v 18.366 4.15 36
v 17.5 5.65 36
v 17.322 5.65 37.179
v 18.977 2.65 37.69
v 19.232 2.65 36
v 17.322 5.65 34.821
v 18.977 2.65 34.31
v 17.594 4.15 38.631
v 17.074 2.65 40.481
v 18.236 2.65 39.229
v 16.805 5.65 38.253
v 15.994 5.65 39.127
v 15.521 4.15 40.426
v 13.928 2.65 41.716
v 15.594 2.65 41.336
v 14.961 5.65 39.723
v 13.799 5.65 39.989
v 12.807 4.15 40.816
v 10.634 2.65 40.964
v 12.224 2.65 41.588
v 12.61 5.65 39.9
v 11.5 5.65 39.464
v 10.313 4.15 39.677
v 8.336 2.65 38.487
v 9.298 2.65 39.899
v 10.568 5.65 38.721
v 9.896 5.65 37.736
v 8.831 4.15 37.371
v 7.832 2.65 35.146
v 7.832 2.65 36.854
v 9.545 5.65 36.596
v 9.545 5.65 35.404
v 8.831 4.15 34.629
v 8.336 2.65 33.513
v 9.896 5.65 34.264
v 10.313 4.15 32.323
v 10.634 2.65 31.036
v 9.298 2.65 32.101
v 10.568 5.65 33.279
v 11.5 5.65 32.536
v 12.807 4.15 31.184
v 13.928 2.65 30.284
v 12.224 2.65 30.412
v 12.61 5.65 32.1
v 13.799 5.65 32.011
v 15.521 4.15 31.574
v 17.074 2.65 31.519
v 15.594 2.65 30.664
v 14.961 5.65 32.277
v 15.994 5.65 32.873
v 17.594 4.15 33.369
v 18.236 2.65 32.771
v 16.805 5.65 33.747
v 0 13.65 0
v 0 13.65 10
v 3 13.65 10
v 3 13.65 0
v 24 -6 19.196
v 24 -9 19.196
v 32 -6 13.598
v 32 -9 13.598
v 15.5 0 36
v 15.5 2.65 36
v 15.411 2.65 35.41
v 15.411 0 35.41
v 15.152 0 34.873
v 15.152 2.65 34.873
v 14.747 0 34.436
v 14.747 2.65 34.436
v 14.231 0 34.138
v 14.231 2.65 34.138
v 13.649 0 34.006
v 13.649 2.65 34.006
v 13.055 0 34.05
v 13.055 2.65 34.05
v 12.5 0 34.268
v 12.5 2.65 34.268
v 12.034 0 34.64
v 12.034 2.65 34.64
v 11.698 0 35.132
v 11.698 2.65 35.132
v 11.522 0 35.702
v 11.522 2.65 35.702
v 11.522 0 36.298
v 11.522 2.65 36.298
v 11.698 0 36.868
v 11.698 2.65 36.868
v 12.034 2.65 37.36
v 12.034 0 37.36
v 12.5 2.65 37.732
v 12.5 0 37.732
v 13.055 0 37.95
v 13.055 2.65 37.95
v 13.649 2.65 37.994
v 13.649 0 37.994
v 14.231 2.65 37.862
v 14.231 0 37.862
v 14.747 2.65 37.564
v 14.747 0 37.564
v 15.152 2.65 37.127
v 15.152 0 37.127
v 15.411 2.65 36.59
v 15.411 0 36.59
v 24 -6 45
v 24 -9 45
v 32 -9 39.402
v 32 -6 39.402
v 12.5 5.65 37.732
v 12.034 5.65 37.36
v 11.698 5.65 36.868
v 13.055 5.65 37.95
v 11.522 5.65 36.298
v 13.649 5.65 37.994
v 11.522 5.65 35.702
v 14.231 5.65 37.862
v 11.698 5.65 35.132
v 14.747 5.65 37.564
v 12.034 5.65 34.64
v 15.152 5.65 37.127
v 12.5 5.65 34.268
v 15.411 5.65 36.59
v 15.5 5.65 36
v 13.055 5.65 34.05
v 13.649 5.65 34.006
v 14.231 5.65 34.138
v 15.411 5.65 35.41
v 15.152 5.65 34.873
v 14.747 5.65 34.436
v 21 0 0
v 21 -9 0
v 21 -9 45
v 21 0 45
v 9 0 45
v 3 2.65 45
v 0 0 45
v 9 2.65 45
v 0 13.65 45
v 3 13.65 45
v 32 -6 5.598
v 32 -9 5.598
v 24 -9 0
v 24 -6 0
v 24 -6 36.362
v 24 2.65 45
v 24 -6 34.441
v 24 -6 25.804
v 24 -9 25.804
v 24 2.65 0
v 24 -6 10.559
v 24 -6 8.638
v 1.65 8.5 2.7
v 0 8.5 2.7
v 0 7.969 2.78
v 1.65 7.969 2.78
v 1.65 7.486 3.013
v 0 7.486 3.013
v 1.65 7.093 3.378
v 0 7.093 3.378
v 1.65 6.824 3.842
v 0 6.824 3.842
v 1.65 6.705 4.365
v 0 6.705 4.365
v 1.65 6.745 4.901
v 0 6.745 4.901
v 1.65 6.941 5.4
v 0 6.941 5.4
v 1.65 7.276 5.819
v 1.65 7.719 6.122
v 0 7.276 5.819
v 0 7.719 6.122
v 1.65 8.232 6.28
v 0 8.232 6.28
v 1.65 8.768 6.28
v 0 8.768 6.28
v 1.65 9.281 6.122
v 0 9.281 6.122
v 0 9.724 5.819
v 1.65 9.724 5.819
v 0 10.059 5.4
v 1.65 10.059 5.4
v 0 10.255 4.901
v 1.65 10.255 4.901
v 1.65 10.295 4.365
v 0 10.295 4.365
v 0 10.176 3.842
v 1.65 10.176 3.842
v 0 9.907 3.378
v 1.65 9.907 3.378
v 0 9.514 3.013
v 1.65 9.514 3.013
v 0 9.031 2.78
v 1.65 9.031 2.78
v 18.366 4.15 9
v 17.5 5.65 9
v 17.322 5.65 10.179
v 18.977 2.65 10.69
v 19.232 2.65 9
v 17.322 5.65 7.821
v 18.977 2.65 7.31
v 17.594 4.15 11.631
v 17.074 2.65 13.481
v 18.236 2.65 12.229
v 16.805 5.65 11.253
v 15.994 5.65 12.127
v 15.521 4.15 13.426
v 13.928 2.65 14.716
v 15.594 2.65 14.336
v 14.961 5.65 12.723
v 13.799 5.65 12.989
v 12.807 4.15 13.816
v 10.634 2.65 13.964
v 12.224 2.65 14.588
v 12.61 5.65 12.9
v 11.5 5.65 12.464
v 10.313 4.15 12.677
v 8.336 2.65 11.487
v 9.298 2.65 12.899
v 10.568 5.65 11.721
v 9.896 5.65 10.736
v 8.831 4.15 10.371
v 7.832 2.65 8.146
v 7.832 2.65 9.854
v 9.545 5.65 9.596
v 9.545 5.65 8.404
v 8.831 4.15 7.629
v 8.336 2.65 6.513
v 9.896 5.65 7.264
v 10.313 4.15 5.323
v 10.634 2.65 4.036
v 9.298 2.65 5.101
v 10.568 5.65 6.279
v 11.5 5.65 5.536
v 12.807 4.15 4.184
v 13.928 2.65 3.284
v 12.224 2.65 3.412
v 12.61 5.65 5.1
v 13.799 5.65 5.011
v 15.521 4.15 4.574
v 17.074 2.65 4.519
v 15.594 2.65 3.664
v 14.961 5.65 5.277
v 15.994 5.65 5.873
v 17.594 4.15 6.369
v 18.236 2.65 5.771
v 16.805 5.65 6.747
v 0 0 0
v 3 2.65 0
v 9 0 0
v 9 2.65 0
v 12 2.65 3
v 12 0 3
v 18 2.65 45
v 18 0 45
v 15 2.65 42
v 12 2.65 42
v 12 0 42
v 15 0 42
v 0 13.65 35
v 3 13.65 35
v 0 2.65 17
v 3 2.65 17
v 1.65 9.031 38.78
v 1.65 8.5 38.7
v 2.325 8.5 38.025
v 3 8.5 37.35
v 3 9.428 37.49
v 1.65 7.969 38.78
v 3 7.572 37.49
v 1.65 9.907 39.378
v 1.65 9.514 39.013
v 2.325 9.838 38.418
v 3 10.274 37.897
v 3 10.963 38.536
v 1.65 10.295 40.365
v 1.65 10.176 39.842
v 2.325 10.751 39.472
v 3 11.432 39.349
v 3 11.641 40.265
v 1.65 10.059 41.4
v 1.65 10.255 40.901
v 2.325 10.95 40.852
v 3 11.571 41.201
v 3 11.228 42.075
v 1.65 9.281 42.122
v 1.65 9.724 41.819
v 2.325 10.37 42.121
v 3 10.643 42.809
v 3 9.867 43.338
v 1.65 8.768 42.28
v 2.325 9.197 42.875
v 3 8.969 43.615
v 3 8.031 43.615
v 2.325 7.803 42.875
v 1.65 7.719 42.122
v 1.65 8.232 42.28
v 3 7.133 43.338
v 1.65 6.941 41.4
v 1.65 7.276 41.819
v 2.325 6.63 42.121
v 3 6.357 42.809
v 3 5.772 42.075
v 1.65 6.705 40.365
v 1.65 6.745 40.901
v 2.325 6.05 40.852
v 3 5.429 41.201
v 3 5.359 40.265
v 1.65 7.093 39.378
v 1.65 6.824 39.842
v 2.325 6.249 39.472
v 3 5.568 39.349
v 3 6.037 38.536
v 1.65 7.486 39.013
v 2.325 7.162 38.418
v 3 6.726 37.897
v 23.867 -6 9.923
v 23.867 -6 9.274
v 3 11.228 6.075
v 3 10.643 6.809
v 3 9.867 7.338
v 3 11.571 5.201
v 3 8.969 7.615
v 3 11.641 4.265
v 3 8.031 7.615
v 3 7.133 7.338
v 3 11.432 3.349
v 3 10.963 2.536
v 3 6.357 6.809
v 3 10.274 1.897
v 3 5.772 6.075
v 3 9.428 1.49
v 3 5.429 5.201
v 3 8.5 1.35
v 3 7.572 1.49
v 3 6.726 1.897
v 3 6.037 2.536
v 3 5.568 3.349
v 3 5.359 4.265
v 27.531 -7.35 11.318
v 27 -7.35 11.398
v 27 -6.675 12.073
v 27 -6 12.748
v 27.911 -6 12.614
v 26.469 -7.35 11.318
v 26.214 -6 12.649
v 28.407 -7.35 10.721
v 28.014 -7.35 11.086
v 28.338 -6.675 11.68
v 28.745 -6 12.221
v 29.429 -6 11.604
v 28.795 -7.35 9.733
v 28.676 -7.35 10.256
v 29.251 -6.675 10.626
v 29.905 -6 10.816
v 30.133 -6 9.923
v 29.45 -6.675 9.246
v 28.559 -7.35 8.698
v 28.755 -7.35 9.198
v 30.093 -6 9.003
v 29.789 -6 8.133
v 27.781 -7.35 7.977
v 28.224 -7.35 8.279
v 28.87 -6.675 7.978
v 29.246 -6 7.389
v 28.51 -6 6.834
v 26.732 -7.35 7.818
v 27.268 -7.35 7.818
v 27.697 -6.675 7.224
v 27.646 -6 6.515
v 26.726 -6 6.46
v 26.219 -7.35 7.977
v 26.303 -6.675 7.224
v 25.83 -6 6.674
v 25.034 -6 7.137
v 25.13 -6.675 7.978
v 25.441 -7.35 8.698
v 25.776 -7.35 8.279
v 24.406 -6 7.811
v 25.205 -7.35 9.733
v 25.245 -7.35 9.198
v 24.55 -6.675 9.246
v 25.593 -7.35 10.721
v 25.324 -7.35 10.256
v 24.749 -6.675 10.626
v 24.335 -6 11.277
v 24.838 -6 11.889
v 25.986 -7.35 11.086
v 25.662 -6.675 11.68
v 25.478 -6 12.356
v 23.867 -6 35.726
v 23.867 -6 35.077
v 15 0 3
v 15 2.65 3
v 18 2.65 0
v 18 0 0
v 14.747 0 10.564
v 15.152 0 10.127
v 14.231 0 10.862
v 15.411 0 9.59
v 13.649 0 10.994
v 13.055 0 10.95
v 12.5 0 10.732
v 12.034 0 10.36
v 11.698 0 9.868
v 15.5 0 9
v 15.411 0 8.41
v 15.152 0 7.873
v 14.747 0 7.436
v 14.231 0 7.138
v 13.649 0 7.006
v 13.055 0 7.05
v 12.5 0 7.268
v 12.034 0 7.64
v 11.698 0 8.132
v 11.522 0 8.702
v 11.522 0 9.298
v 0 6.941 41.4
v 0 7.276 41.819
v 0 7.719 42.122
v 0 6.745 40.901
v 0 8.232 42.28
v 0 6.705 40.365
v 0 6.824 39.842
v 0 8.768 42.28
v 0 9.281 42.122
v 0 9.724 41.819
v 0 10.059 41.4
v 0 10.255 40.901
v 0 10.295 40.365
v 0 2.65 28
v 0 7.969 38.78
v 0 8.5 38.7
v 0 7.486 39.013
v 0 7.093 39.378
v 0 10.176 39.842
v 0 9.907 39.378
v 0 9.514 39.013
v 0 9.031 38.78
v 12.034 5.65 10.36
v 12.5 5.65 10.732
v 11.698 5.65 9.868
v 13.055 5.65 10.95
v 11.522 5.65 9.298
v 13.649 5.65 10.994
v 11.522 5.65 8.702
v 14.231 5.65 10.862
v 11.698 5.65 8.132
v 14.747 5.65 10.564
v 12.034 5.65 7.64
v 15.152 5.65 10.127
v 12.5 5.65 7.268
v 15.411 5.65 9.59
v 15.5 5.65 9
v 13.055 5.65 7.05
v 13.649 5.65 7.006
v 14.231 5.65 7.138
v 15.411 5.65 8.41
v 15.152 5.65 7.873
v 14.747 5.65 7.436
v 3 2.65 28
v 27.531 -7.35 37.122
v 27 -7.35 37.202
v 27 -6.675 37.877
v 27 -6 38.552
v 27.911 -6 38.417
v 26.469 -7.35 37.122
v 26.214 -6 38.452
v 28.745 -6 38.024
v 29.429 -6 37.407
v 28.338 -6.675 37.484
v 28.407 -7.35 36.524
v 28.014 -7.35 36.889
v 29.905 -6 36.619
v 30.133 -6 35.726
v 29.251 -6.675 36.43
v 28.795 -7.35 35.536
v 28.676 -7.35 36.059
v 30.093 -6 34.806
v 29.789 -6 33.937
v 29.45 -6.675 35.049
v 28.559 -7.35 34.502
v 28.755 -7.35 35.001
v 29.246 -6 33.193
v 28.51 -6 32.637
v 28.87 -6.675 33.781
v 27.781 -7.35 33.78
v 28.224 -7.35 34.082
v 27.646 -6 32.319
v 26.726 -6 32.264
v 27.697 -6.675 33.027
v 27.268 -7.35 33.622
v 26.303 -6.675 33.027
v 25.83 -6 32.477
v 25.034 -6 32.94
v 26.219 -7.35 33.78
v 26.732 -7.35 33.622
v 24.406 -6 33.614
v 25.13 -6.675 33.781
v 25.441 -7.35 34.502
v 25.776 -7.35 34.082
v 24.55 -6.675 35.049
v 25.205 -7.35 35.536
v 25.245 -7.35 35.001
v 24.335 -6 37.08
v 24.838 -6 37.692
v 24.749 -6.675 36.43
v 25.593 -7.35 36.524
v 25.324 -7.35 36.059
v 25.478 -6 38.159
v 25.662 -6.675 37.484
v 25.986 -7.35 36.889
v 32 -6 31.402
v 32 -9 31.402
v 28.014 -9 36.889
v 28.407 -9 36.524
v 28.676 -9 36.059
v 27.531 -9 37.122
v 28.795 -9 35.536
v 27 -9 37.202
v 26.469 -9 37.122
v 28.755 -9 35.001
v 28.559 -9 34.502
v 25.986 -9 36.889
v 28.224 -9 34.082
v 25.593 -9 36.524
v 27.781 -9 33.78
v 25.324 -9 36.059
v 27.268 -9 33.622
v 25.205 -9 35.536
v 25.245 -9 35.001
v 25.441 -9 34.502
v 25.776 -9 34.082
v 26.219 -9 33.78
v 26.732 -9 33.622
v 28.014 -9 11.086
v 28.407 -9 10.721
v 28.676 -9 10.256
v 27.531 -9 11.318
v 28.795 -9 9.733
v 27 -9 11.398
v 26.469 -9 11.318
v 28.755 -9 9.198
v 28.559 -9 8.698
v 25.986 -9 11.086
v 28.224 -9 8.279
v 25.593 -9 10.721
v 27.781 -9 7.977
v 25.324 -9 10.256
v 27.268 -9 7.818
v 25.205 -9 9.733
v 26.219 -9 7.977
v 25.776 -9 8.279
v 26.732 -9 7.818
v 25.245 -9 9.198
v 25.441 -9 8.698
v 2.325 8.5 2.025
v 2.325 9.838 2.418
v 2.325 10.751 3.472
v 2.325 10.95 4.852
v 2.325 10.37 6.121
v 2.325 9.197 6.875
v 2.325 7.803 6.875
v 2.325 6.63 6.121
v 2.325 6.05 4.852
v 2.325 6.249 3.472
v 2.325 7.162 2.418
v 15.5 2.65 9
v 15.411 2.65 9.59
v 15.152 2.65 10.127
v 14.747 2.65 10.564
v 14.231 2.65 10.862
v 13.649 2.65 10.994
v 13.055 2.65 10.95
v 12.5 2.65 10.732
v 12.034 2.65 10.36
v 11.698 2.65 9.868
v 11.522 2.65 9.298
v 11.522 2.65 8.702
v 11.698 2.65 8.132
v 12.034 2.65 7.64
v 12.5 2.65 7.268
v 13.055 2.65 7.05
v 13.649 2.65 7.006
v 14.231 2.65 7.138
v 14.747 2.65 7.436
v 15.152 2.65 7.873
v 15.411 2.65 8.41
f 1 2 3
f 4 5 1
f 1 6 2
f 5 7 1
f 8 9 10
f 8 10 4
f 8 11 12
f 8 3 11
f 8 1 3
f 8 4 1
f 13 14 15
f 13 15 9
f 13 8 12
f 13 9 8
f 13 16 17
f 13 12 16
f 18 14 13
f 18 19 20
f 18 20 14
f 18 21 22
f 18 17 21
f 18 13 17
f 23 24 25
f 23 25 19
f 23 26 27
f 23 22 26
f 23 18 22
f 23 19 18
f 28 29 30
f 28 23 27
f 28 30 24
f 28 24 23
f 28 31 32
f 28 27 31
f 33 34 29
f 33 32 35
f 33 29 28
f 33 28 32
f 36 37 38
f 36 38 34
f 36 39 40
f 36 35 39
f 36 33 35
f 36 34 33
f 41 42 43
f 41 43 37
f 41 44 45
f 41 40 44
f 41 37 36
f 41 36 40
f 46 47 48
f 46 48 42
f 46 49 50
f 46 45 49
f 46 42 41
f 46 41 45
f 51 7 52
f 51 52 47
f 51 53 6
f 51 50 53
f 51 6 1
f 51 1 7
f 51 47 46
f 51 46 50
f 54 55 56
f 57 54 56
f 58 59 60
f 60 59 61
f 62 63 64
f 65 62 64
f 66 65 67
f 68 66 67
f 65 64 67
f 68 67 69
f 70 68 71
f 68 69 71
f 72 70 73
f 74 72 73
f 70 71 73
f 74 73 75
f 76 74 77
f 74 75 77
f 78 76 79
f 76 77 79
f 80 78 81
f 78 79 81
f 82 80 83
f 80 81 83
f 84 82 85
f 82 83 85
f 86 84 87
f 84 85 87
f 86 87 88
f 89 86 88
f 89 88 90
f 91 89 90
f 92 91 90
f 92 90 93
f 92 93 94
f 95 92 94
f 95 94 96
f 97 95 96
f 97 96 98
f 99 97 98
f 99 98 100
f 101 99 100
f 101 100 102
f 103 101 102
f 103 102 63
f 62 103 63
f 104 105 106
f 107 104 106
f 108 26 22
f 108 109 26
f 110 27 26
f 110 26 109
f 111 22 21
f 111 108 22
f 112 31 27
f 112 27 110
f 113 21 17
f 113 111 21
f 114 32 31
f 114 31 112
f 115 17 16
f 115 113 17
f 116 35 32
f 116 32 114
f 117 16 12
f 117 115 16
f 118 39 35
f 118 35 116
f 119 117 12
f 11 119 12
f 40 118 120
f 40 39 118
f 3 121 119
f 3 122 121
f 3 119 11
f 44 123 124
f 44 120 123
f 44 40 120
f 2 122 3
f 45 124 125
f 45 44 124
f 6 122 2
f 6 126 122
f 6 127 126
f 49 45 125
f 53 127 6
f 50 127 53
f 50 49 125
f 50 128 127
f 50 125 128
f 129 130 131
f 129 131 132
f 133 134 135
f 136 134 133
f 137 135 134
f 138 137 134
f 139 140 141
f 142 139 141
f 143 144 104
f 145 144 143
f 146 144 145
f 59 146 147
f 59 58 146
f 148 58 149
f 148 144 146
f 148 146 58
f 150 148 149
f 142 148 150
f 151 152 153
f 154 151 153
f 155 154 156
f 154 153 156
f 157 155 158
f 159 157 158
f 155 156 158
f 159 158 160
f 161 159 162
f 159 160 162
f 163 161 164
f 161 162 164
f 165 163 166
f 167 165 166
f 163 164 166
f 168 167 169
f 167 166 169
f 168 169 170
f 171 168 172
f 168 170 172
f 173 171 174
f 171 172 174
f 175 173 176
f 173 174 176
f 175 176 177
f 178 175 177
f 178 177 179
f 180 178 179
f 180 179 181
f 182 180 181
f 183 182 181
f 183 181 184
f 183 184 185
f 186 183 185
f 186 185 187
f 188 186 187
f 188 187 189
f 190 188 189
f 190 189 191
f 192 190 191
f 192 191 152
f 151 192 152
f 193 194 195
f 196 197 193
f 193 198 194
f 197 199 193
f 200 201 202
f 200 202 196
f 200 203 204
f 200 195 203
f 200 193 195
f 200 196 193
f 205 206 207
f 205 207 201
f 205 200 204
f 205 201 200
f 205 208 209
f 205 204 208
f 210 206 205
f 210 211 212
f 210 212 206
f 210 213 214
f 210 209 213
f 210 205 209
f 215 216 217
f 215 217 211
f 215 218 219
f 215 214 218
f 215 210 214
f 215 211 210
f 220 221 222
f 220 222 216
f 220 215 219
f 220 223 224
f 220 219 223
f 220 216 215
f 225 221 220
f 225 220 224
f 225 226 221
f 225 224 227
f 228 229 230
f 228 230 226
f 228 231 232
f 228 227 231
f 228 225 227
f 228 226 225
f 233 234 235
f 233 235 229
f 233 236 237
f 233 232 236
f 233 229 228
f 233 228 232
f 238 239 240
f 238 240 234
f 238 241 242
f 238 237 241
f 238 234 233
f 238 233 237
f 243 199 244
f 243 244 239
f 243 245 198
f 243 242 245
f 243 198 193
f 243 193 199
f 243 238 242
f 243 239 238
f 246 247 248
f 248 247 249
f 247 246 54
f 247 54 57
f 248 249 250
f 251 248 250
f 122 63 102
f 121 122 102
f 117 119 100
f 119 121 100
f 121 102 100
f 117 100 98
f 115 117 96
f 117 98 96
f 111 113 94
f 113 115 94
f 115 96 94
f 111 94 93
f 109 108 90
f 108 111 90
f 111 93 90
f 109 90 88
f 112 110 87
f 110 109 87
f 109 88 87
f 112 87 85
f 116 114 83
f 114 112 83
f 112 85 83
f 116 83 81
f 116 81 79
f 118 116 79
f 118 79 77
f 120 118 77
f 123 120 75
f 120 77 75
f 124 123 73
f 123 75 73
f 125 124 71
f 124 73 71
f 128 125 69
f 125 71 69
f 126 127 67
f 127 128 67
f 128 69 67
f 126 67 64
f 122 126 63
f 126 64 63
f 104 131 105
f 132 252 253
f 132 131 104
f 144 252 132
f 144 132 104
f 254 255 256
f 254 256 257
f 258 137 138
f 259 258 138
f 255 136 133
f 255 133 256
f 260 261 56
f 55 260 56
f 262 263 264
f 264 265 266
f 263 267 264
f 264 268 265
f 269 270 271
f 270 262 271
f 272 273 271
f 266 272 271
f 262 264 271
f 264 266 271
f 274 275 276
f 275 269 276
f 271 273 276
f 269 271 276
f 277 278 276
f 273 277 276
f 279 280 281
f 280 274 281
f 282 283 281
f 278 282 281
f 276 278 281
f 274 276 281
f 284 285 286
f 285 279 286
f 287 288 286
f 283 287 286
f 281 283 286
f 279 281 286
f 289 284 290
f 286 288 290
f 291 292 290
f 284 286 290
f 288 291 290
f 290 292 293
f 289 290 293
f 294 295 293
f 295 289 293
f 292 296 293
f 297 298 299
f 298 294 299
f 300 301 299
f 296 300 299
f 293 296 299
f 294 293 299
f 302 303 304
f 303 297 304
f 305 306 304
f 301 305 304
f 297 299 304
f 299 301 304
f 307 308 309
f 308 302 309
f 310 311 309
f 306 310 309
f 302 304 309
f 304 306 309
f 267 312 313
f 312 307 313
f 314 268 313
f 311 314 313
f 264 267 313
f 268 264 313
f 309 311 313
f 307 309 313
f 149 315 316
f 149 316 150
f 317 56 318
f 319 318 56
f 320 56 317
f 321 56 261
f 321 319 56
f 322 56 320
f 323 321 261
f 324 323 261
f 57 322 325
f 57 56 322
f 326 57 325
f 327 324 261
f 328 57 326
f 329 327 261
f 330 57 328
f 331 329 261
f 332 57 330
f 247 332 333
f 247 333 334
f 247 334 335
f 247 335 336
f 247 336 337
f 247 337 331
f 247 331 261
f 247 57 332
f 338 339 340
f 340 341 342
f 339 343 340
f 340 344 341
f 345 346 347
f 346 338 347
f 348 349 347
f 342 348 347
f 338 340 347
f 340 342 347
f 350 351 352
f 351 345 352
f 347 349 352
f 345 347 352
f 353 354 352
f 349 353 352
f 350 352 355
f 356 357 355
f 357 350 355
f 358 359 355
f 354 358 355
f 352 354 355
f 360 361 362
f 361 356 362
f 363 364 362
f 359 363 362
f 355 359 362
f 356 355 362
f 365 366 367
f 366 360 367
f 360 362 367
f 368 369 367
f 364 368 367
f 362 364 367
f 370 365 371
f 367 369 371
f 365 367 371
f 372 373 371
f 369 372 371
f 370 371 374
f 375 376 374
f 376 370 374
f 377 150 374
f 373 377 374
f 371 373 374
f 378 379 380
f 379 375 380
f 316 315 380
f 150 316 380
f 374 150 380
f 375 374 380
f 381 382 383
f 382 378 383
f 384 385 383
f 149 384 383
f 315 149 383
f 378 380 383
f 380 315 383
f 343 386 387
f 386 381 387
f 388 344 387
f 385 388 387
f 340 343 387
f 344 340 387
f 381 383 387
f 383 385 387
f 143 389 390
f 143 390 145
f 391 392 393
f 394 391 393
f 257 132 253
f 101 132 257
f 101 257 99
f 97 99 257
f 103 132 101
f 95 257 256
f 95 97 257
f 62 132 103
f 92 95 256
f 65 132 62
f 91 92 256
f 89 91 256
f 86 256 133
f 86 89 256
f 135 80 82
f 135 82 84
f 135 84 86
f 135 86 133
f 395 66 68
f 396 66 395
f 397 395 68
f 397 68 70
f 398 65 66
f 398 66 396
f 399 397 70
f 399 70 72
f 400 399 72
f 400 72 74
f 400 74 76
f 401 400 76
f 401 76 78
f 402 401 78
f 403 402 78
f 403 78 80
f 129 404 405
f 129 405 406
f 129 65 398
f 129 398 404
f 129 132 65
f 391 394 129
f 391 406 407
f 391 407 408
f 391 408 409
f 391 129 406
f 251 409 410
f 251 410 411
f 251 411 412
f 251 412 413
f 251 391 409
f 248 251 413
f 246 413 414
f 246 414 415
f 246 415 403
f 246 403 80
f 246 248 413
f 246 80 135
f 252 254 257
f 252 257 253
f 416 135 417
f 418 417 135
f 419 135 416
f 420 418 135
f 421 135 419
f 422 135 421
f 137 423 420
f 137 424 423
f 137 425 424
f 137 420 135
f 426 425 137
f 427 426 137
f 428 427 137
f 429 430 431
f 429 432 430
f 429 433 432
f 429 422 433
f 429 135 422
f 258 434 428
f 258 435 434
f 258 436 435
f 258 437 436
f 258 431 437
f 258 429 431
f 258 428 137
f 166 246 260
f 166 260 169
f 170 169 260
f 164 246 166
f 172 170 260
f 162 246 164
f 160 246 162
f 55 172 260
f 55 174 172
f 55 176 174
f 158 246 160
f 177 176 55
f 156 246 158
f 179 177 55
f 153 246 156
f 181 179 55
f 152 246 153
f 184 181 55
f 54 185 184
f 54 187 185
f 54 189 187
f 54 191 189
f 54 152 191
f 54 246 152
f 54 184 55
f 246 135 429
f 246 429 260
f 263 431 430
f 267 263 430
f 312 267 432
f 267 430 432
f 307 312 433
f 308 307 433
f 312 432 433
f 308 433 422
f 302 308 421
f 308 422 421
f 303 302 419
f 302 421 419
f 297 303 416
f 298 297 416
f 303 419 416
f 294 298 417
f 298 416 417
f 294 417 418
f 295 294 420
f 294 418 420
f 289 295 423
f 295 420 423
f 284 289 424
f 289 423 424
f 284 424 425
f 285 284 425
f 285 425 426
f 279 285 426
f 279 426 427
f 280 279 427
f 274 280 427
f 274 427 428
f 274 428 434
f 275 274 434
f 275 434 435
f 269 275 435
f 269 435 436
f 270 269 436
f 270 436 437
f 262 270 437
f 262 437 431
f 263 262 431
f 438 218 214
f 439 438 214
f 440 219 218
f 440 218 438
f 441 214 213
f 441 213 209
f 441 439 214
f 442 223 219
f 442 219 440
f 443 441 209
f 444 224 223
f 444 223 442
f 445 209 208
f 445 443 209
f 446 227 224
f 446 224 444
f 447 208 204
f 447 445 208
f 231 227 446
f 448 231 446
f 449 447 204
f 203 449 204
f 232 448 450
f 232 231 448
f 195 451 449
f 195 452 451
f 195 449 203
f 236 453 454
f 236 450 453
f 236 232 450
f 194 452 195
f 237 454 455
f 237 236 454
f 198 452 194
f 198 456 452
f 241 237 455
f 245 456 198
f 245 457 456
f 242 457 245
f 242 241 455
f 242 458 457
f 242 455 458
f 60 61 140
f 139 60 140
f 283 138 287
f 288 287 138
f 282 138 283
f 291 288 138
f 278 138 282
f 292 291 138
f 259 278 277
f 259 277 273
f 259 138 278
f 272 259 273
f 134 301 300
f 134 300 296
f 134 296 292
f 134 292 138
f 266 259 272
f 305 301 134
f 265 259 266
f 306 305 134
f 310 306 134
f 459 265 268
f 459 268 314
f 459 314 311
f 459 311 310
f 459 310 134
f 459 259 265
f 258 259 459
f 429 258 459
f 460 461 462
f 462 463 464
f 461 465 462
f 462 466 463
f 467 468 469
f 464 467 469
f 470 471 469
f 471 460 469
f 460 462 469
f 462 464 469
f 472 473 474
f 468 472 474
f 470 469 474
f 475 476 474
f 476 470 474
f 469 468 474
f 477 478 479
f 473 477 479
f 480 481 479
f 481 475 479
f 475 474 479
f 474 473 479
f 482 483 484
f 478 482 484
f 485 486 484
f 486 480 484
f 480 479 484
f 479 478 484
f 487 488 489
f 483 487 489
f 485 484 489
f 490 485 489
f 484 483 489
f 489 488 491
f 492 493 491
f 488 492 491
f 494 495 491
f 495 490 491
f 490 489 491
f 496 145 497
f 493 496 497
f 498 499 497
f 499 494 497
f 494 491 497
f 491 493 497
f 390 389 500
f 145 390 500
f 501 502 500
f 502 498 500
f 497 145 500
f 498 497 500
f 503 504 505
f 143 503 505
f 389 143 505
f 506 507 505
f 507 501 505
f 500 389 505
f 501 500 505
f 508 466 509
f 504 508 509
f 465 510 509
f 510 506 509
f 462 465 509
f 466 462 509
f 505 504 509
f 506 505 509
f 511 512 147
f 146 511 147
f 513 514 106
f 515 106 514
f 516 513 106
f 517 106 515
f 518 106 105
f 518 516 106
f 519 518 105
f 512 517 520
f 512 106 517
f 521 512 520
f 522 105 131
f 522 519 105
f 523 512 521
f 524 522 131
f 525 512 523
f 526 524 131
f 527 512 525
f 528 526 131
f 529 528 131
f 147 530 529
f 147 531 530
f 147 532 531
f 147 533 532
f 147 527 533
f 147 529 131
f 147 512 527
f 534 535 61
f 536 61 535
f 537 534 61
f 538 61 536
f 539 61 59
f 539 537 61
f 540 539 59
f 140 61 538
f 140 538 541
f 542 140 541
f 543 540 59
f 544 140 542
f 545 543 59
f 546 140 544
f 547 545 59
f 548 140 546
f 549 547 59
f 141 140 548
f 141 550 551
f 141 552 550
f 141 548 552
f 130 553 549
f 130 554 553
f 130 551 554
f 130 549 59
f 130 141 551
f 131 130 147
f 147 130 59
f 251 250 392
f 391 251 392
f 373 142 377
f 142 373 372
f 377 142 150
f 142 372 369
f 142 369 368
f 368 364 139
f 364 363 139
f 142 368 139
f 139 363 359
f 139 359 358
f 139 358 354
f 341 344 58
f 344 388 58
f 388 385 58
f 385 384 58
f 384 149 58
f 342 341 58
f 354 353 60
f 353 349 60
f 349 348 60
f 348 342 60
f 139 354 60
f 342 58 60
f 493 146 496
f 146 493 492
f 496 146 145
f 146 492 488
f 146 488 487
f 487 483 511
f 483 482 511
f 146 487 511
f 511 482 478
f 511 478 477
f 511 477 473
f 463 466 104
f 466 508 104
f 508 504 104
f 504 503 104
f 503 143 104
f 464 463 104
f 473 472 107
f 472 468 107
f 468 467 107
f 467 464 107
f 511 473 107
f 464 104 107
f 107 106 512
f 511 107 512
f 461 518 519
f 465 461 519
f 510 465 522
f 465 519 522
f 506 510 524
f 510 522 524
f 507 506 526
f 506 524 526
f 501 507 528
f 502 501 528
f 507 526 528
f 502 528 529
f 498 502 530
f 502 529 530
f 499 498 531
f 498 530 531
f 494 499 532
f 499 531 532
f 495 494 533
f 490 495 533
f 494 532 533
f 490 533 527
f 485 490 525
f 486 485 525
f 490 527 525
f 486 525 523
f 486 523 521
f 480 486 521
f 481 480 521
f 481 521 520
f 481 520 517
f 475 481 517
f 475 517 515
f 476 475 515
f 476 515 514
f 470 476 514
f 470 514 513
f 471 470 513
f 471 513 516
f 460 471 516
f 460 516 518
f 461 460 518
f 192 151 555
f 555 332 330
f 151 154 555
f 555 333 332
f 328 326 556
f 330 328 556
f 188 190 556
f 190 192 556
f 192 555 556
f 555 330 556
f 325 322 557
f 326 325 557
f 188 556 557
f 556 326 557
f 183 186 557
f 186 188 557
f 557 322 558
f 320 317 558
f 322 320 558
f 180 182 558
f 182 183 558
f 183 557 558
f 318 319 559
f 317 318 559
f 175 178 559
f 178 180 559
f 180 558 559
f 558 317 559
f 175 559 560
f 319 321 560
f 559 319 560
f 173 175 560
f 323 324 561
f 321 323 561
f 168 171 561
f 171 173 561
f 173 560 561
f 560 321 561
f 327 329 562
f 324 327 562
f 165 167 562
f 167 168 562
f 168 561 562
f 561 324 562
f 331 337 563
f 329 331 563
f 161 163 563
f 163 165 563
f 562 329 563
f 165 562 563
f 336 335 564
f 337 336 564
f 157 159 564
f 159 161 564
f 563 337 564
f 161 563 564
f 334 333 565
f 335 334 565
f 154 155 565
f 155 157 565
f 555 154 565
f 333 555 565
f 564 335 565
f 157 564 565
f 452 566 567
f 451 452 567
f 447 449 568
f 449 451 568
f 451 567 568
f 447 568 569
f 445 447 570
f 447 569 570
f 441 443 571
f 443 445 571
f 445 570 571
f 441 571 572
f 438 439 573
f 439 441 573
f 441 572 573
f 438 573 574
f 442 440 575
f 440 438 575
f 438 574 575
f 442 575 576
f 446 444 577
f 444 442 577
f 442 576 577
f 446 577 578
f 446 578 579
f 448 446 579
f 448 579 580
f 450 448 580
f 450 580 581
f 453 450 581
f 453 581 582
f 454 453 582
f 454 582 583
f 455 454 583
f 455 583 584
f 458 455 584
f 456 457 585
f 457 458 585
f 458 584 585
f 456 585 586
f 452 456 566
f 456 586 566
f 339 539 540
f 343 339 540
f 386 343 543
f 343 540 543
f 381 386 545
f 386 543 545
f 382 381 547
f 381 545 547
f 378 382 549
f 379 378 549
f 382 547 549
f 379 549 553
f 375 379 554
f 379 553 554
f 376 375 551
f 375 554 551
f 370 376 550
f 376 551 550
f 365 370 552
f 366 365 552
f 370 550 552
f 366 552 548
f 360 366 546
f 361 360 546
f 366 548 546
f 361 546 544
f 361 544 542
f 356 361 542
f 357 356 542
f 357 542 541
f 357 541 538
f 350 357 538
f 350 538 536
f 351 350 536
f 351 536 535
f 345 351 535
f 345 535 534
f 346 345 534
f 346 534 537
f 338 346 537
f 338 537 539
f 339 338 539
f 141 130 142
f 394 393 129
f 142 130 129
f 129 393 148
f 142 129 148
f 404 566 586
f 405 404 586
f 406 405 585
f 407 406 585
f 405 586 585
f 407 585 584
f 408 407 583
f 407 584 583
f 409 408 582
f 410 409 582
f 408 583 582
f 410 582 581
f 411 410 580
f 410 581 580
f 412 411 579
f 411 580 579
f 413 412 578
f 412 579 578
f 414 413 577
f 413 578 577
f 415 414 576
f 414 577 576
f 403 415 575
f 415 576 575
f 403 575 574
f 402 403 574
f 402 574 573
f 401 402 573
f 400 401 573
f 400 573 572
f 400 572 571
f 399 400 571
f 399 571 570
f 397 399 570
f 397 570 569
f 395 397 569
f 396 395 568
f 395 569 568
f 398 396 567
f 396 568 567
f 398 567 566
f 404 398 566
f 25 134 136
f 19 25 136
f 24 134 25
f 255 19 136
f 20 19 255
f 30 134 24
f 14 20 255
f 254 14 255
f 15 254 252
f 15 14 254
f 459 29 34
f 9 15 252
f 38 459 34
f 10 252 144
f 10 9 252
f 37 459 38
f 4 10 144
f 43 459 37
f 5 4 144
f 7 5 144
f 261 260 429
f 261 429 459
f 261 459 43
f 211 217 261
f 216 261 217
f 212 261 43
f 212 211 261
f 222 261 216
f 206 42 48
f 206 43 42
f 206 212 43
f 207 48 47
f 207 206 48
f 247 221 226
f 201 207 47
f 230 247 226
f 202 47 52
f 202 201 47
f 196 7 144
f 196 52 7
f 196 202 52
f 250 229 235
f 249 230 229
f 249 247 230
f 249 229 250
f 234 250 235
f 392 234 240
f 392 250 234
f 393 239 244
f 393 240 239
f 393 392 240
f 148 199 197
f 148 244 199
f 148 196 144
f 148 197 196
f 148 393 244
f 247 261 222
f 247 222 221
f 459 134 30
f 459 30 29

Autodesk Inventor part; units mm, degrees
ref_plane "YZ Plane" through (0, 0, 0) normal (1, 0, 0) x (0, 1, 0)
ref_plane "XZ Plane" through (0, 0, 0) normal (0, 1, 0) x (-1, 0, 0)
ref_plane "XY Plane" through (0, 0, 0) normal (0, 0, 1) x (1, 0, 0)
sketch "Sketch1" plane through (0, 0, 0) normal (0, 0, 1) x (1, 0, 0)
  line L0 (3, 13.65) -> (3, 2.65)
  line L1 (3, 2.65) -> (24, 2.65)
  line L2 (24, 2.65) -> (24, -9)
  line L3 (24, -9) -> (21, -9)
  line L4 (21, -9) -> (21, 0)
  line L5 (21, 0) -> (0, 0)
  line L6 (0, 0) -> (0, 13.65)
  line L7 (0, 13.65) -> (3, 13.65)
  dimension "d0" = 2.65
  dimension "d1" = 21
  dimension "d2" = 9
  dimension "d3" = 3
  dimension "d4" = 3
  dimension "d5" = 11
extrude "Extrusion1" add sketch "Sketch1" along normal blind 45
sketch "Sketch2" plane through (3, 2.65, 0) normal (1, 0, 0) x (0, 0, -1)
  line L0 (0, 11) -> (-45, 11) projected
  line L1 (-35, 11) -> (-28, 0)
  line L2 (-17, 0) -> (-10, 11)
  line L3 (0, 0) -> (0, 11) projected
  line L4 (0, 11) -> (-45, 11) projected
  line L5 (-45, 0) -> (-45, 11) projected
  line L6 (0, 0) -> (-45, 0) projected
  point P0 (0, -2.65)
  dimension "d10" = 10
  dimension "d11" = 10
  dimension "d38" = 11
extrude "Extrusion2" cut sketch "Sketch2" against normal through all contours L2 L6 L1 L0
ref_plane "Work Plane1" through (0, 0, 22.5) normal (0, 0, 1) x (1, 0, 0)
sketch "Sketch3" plane through (3, 2.65, 0) normal (0, 1, 0) x (1, 0, 0)
  line L0 (-3, 0) -> (18, 0) projected
  line L1 (6, 0) -> (9, -3)
  line L2 (9, -3) -> (12, -3)
  line L3 (12, -3) -> (15, 0)
  line L4 (6, -45) -> (9, -42)
  line L5 (9, -42) -> (12, -42)
  line L6 (12, -42) -> (15, -45)
  line L7 (21, 0) -> (0, 0) projected
  line L8 (0, 0) -> (0, -17) projected
  line L9 (0, -17) -> (-3, -17) projected
  line L10 (-3, -28) -> (-3, -17) projected
  line L11 (0, -28) -> (-3, -28) projected
  line L12 (0, -28) -> (0, -45) projected
  line L13 (21, -45) -> (0, -45) projected
  line L14 (21, 0) -> (21, -45) projected
  point P0 (10.5, -3)
  point P1 (10.5, 0)
  point P2 (10.5, -42)
  point P3 (10.5, -45)
  dimension "d14" = 45
  dimension "d15" = 45
  dimension "d16" = 3
  dimension "d17" = 3
  dimension "d18" = 3
extrude "Extrusion3" cut sketch "Sketch3" against normal through all contours L0 L3 L2 L1 | L13 L4 L5 L6
sketch "Sketch4" plane through (3, 2.65, 45) normal (1, 0, 0) x (0, 0, -1)
  line L0 (0, 0) -> (0, 11) projected
  line L1 (45, 0) -> (45, 11) projected
  line L2 (45, 11) -> (35, 11) projected
  line L3 (10, 11) -> (0, 11) projected
  point P0 (45, -2.65)
  point P1 (40.5, 5.85)
  point P2 (4.5, 5.85)
  point P3 (0, 5.5)
  point P4 (45, 5.5)
  dimension "d21" = 4.5
  dimension "d22" = 4.5
  dimension "d46" = 5.15
hole "Hole1" at (3, 8.5, 4.5) at (3, 8.5, 40.5) direction (-1, 0, 0) diameter 3.6 end through all countersink diameter 6.3 countersink angle 90 clearance for "Flat Head Machine Screw" size "M3" standard "Ansi Metric M Profile"
sketch "Sketch5" plane through (21, -9, 0) normal (0, -1, 0) x (1, 0, 0)
  line L0 (0, 0) -> (3, 0) projected
  line L1 (3, 0) -> (3, 45) projected
  line L2 (0, 45) -> (3, 45) projected
  line L3 (0, 0) -> (0, 45) projected
  line L4 (3, 0) -> (3, 45) projected
  line L5 (3, 19.1965) -> (11, 13.5983)
  line L6 (11, 13.5983) -> (11, 5.5983)
  line L7 (11, 5.5983) -> (3, 0)
  line L8 (3, 45) -> (11, 39.4017)
  line L9 (11, 39.4017) -> (11, 31.4017)
  line L10 (11, 31.4017) -> (3, 25.8035)
  line L11 (3, 0) -> (-3, 0) projected
  line L12 (3, 45) -> (-3, 45) projected
  point P0 (-21, 0)
  point P1 (3, 22.5)
  dimension "d30" = 8
  dimension "d31" = 8
  dimension "d32" = 8
  dimension "d33" = 8
  dimension "d66" = 5.5983
  dimension "d67" = 5.5983
extrude "Extrusion4" add sketch "Sketch5" against normal blind 3 contours L1 L5 L6 L7 | L8 L9 L10 L1
sketch "Sketch6" plane through (21, -6, 0) normal (0, 1, 0) x (1, 0, 0)
  line L0 (3, -19.1965) -> (11, -13.5983) projected
  line L1 (11, -13.5983) -> (11, -5.5983) projected
  line L2 (11, -5.5983) -> (3, 0) projected
  line L3 (3, -19.1965) -> (3, 0) projected
  line L4 (3, -45) -> (11, -39.4017) projected
  line L5 (11, -39.4017) -> (11, -31.4017) projected
  line L6 (11, -31.4017) -> (3, -25.8035) projected
  line L7 (3, -19.1965) -> (3, 0) projected
  line L8 (3, -45) -> (3, -25.8035) projected
  line L9 (3, -19.1965) -> (11, -13.5983) projected
  line L10 (11, -13.5983) -> (11, -5.5983) projected
  line L11 (11, -5.5983) -> (3, 0) projected
  line L12 (3, -45) -> (11, -39.4017) projected
  line L13 (11, -39.4017) -> (11, -31.4017) projected
  line L14 (11, -31.4017) -> (3, -25.8035) projected
  line L15 (3, -45) -> (3, -25.8035) projected
  point P0 (-21, 0)
  point P1 (6, -35.4017)
  point P2 (6, -9.5983)
  point P3 (7, -16.3974)
  point P4 (7, -28.6026)
  point P5 (11, -35.4017)
  point P6 (11, -9.5983)
  dimension "d62" = 3
hole "Hole2" at (27, -6, 35.4017) at (27, -6, 9.5983) direction (0, -1, 0) diameter 3.6 end through all countersink diameter 6.3 countersink angle 90 clearance for "Flat Head Machine Screw" size "M3" standard "Ansi Metric M Profile"
sketch "Sketch7" plane through (24, 2.65, 45) normal (0, 1, 0) x (1, 0, 0)
  circle A0 centre (-10.5, 36) radius 2
  circle A1 centre (-10.5, 9) radius 2
  circle A2 centre (-10.5, 9) radius 4
  circle A3 centre (-10.5, 36) radius 4
  line L0 (-12, 3) -> (-9, 3) projected
  line L1 (-24, 17) -> (-24, 28) projected
  line L2 (-24, 22.5) -> (-9, 22.5) construction
  point P0 (-24, 45)
  point P1 (-10.5, 3)
  dimension "d48" = 4
  dimension "d49" = 13.5
  dimension "d50" = 13.5
  dimension "d51" = 8
  dimension "d61" = 27
extrude "Extrusion5" add sketch "Sketch7" along normal blind 3
extrude "Extrusion6" cut sketch "Sketch7" against normal through all contours A0 | A1
draft "FaceDraft1" angle 30 pull direction (0, 1, 0) faces at (17.487, 4.65, 36.3219) fixed edges at (9.5, 5.65, 36)
draft "FaceDraft2" angle 30 pull direction (0, 1, 0) faces at (17.487, 4.65, 9.3219) fixed edges at (9.5, 5.65, 9)
equation "\"d21\" = d22"
equation "\"d30\" = d31"
equation "\"d32\" = d31"
equation "\"d33\" = d30"
equation "\"d50\" = d49"
properties part number "ESC Mount"
